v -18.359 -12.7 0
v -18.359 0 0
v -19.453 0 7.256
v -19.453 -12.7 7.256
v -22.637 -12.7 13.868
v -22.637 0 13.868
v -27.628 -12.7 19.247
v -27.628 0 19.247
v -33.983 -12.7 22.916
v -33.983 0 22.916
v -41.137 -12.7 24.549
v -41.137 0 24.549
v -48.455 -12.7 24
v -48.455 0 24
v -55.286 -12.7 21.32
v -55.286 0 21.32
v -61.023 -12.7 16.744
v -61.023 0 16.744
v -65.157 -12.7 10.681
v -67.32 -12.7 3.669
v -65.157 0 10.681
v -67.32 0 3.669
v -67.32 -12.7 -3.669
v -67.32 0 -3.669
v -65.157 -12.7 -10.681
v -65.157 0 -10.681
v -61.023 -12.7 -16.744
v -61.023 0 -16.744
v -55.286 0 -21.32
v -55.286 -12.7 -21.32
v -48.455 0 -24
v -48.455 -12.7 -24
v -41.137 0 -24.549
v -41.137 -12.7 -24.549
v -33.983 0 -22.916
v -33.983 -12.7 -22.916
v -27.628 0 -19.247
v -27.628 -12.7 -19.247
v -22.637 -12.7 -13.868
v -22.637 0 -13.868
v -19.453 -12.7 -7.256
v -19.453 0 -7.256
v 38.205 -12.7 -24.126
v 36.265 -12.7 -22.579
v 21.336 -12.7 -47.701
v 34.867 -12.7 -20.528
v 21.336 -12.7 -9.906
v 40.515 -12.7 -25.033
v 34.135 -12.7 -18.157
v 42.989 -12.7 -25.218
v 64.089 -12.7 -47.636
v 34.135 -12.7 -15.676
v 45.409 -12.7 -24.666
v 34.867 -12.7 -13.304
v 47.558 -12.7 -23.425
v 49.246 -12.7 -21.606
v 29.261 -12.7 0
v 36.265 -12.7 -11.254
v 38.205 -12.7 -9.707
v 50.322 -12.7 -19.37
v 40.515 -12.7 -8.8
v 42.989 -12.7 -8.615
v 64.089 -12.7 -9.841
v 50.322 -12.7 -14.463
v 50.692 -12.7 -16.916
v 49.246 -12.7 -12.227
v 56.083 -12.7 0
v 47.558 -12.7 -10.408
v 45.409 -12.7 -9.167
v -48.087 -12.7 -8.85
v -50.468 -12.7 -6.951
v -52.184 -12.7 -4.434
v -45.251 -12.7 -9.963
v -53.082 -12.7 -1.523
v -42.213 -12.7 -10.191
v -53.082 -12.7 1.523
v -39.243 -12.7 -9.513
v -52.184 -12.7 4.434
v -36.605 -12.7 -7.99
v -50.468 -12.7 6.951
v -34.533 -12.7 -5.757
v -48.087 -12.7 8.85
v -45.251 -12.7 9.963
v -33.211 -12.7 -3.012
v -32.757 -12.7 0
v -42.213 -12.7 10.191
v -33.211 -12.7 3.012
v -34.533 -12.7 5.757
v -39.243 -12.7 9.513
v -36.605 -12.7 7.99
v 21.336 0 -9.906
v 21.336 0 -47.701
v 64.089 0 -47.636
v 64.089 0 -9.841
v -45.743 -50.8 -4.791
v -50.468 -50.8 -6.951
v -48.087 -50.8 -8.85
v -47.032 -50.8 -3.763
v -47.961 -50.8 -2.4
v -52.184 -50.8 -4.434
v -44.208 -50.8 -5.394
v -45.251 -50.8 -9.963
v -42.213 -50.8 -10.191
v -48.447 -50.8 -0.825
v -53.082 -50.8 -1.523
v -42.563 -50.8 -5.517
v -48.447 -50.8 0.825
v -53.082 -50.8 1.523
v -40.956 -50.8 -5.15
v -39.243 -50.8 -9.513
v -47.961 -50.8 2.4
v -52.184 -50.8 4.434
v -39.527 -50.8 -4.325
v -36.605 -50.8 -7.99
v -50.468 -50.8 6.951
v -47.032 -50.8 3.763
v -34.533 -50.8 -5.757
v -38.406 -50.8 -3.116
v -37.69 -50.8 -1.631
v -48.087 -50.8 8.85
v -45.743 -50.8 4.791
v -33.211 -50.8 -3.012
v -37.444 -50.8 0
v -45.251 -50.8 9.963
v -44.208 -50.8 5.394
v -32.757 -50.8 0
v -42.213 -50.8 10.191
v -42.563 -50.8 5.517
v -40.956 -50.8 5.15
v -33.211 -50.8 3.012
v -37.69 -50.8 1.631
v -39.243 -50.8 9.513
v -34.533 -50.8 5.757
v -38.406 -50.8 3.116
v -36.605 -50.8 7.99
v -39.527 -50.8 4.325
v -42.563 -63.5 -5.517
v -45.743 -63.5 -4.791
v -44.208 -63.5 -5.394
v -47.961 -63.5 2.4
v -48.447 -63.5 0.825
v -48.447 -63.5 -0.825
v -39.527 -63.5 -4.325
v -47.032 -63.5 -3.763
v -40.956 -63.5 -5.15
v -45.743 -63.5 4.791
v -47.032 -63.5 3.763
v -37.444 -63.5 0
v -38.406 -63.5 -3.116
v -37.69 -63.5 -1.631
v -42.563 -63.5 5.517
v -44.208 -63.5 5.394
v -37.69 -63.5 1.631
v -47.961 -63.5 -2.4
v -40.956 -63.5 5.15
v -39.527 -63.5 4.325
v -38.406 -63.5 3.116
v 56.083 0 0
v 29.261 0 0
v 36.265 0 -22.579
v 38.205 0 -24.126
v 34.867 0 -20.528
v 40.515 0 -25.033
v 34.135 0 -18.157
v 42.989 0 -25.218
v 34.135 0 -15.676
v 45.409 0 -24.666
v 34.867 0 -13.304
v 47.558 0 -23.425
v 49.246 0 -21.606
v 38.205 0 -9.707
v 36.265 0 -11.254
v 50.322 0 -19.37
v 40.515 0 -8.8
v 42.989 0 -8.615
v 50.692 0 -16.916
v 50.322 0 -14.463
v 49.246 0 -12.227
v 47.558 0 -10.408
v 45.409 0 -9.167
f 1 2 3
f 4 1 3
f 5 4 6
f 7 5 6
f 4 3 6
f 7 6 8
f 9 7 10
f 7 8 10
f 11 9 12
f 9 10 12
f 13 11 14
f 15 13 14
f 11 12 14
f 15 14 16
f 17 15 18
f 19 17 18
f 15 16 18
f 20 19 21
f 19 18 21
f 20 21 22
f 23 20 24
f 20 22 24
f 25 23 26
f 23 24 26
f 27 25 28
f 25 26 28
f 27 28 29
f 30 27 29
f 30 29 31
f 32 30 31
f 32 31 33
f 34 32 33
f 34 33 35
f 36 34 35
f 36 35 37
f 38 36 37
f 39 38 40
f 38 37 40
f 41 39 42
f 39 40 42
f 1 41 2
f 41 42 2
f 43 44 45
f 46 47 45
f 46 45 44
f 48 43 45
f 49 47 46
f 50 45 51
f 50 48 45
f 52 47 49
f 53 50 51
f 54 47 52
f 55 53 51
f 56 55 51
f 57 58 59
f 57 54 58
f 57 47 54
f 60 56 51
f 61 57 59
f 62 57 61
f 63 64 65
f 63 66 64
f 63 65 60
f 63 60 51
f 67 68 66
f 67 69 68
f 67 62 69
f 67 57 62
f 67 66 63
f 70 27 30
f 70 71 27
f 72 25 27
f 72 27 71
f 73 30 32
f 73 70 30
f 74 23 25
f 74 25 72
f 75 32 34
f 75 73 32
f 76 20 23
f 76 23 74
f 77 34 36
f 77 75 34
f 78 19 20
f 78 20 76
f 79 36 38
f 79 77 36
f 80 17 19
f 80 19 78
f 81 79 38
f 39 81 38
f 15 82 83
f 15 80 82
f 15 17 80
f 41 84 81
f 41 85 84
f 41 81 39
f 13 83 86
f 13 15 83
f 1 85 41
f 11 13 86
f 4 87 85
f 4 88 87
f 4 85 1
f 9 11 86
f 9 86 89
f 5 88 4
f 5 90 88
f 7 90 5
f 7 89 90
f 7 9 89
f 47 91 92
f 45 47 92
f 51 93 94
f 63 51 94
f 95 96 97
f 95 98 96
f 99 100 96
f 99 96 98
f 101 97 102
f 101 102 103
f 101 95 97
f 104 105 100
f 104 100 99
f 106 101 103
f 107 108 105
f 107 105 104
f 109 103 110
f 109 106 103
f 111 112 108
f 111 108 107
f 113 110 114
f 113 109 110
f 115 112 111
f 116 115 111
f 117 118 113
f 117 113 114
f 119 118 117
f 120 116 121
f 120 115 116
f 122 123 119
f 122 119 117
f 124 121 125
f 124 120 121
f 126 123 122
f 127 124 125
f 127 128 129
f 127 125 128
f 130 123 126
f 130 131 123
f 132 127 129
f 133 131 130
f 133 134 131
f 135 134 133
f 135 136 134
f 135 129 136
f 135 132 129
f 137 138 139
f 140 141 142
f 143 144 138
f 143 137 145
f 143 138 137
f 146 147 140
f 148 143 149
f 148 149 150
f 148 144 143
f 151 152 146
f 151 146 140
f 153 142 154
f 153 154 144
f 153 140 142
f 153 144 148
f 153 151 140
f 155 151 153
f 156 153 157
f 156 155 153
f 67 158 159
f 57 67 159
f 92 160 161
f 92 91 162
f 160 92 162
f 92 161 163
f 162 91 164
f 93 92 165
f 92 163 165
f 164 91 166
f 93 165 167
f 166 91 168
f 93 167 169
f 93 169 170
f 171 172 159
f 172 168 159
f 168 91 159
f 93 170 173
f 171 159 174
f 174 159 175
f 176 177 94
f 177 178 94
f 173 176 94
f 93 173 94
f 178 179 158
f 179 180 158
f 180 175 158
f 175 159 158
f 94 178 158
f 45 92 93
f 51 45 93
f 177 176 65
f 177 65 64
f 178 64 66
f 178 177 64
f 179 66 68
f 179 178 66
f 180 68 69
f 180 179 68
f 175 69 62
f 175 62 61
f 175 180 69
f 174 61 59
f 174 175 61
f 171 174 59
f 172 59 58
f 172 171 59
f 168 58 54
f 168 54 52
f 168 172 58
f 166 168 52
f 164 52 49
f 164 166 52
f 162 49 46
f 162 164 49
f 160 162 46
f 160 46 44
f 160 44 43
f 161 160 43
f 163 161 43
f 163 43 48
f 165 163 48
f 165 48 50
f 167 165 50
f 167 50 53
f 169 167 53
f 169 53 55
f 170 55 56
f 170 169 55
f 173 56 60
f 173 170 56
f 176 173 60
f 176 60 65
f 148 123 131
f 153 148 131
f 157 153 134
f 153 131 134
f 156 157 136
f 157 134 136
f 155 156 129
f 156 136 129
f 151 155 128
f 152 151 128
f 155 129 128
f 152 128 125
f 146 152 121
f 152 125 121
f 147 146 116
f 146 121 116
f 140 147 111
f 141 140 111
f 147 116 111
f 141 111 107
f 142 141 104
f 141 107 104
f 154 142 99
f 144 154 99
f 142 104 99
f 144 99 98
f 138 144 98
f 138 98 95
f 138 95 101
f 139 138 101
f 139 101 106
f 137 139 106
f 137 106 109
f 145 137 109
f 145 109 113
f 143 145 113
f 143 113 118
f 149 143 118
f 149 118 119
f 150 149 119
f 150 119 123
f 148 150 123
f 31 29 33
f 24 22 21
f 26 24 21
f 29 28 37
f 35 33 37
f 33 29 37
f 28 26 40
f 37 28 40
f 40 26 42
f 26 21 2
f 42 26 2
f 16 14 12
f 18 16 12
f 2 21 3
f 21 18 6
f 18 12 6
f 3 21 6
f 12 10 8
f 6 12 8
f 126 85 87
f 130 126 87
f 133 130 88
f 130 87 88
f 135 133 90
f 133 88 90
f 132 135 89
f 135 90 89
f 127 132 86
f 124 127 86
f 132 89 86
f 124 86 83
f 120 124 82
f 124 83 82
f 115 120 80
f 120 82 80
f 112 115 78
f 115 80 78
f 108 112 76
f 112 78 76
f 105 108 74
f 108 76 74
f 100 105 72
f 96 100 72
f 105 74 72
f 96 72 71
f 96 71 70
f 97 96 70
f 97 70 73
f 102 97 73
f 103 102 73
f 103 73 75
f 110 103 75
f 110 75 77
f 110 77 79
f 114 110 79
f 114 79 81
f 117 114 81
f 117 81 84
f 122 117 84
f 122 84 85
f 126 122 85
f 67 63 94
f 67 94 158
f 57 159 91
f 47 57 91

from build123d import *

# Parameters (mm, degrees)
F0_R     = 8.325002
F1_DEPTH = 12.7
F2_R     = 10.219437
F2_R_2   = 5.532315
F3_DEPTH = 50.8
F2_R_3   = 24.617675
F4_DEPTH = 12.7
F5_DEPTH = 63.5


with BuildPart() as f1:
    # F0 (on Front) → F1 (new body)
    with BuildSketch(Plane.XZ):
        Polygon((56.083199, 0), (29.260799, 0), (21.336, -9.906), (21.336, -47.701199), (64.089097, -47.635771), (64.089097, -9.840573), align=None)
        with Locations((42.367201, -16.9164)):
            Circle(F0_R, mode=Mode.SUBTRACT)
    extrude(amount=F1_DEPTH)


with BuildPart() as f3:
    # F2 (on Front) → F3 (new body)
    with BuildSketch(Plane.XZ):
        with Locations((-42.9768, 0)):
            Circle(F2_R)
        with Locations((-42.9768, 0)):
            Circle(F2_R_2, mode=Mode.SUBTRACT)
    extrude(amount=F3_DEPTH)

    # F2 (on Front) → F4 (join)
    with BuildSketch(Plane.XZ):
        with Locations((-42.9768, 0)):
            Circle(F2_R_3)
        with Locations((-42.9768, 0)):
            Circle(F2_R, mode=Mode.SUBTRACT)
    extrude(amount=F4_DEPTH)

    # F2 (on Front) → F5 (join)
    with BuildSketch(Plane.XZ):
        with Locations((-42.9768, 0)):
            Circle(F2_R_2)
    extrude(amount=F5_DEPTH)


solid = Compound([f1.part, f3.part])
